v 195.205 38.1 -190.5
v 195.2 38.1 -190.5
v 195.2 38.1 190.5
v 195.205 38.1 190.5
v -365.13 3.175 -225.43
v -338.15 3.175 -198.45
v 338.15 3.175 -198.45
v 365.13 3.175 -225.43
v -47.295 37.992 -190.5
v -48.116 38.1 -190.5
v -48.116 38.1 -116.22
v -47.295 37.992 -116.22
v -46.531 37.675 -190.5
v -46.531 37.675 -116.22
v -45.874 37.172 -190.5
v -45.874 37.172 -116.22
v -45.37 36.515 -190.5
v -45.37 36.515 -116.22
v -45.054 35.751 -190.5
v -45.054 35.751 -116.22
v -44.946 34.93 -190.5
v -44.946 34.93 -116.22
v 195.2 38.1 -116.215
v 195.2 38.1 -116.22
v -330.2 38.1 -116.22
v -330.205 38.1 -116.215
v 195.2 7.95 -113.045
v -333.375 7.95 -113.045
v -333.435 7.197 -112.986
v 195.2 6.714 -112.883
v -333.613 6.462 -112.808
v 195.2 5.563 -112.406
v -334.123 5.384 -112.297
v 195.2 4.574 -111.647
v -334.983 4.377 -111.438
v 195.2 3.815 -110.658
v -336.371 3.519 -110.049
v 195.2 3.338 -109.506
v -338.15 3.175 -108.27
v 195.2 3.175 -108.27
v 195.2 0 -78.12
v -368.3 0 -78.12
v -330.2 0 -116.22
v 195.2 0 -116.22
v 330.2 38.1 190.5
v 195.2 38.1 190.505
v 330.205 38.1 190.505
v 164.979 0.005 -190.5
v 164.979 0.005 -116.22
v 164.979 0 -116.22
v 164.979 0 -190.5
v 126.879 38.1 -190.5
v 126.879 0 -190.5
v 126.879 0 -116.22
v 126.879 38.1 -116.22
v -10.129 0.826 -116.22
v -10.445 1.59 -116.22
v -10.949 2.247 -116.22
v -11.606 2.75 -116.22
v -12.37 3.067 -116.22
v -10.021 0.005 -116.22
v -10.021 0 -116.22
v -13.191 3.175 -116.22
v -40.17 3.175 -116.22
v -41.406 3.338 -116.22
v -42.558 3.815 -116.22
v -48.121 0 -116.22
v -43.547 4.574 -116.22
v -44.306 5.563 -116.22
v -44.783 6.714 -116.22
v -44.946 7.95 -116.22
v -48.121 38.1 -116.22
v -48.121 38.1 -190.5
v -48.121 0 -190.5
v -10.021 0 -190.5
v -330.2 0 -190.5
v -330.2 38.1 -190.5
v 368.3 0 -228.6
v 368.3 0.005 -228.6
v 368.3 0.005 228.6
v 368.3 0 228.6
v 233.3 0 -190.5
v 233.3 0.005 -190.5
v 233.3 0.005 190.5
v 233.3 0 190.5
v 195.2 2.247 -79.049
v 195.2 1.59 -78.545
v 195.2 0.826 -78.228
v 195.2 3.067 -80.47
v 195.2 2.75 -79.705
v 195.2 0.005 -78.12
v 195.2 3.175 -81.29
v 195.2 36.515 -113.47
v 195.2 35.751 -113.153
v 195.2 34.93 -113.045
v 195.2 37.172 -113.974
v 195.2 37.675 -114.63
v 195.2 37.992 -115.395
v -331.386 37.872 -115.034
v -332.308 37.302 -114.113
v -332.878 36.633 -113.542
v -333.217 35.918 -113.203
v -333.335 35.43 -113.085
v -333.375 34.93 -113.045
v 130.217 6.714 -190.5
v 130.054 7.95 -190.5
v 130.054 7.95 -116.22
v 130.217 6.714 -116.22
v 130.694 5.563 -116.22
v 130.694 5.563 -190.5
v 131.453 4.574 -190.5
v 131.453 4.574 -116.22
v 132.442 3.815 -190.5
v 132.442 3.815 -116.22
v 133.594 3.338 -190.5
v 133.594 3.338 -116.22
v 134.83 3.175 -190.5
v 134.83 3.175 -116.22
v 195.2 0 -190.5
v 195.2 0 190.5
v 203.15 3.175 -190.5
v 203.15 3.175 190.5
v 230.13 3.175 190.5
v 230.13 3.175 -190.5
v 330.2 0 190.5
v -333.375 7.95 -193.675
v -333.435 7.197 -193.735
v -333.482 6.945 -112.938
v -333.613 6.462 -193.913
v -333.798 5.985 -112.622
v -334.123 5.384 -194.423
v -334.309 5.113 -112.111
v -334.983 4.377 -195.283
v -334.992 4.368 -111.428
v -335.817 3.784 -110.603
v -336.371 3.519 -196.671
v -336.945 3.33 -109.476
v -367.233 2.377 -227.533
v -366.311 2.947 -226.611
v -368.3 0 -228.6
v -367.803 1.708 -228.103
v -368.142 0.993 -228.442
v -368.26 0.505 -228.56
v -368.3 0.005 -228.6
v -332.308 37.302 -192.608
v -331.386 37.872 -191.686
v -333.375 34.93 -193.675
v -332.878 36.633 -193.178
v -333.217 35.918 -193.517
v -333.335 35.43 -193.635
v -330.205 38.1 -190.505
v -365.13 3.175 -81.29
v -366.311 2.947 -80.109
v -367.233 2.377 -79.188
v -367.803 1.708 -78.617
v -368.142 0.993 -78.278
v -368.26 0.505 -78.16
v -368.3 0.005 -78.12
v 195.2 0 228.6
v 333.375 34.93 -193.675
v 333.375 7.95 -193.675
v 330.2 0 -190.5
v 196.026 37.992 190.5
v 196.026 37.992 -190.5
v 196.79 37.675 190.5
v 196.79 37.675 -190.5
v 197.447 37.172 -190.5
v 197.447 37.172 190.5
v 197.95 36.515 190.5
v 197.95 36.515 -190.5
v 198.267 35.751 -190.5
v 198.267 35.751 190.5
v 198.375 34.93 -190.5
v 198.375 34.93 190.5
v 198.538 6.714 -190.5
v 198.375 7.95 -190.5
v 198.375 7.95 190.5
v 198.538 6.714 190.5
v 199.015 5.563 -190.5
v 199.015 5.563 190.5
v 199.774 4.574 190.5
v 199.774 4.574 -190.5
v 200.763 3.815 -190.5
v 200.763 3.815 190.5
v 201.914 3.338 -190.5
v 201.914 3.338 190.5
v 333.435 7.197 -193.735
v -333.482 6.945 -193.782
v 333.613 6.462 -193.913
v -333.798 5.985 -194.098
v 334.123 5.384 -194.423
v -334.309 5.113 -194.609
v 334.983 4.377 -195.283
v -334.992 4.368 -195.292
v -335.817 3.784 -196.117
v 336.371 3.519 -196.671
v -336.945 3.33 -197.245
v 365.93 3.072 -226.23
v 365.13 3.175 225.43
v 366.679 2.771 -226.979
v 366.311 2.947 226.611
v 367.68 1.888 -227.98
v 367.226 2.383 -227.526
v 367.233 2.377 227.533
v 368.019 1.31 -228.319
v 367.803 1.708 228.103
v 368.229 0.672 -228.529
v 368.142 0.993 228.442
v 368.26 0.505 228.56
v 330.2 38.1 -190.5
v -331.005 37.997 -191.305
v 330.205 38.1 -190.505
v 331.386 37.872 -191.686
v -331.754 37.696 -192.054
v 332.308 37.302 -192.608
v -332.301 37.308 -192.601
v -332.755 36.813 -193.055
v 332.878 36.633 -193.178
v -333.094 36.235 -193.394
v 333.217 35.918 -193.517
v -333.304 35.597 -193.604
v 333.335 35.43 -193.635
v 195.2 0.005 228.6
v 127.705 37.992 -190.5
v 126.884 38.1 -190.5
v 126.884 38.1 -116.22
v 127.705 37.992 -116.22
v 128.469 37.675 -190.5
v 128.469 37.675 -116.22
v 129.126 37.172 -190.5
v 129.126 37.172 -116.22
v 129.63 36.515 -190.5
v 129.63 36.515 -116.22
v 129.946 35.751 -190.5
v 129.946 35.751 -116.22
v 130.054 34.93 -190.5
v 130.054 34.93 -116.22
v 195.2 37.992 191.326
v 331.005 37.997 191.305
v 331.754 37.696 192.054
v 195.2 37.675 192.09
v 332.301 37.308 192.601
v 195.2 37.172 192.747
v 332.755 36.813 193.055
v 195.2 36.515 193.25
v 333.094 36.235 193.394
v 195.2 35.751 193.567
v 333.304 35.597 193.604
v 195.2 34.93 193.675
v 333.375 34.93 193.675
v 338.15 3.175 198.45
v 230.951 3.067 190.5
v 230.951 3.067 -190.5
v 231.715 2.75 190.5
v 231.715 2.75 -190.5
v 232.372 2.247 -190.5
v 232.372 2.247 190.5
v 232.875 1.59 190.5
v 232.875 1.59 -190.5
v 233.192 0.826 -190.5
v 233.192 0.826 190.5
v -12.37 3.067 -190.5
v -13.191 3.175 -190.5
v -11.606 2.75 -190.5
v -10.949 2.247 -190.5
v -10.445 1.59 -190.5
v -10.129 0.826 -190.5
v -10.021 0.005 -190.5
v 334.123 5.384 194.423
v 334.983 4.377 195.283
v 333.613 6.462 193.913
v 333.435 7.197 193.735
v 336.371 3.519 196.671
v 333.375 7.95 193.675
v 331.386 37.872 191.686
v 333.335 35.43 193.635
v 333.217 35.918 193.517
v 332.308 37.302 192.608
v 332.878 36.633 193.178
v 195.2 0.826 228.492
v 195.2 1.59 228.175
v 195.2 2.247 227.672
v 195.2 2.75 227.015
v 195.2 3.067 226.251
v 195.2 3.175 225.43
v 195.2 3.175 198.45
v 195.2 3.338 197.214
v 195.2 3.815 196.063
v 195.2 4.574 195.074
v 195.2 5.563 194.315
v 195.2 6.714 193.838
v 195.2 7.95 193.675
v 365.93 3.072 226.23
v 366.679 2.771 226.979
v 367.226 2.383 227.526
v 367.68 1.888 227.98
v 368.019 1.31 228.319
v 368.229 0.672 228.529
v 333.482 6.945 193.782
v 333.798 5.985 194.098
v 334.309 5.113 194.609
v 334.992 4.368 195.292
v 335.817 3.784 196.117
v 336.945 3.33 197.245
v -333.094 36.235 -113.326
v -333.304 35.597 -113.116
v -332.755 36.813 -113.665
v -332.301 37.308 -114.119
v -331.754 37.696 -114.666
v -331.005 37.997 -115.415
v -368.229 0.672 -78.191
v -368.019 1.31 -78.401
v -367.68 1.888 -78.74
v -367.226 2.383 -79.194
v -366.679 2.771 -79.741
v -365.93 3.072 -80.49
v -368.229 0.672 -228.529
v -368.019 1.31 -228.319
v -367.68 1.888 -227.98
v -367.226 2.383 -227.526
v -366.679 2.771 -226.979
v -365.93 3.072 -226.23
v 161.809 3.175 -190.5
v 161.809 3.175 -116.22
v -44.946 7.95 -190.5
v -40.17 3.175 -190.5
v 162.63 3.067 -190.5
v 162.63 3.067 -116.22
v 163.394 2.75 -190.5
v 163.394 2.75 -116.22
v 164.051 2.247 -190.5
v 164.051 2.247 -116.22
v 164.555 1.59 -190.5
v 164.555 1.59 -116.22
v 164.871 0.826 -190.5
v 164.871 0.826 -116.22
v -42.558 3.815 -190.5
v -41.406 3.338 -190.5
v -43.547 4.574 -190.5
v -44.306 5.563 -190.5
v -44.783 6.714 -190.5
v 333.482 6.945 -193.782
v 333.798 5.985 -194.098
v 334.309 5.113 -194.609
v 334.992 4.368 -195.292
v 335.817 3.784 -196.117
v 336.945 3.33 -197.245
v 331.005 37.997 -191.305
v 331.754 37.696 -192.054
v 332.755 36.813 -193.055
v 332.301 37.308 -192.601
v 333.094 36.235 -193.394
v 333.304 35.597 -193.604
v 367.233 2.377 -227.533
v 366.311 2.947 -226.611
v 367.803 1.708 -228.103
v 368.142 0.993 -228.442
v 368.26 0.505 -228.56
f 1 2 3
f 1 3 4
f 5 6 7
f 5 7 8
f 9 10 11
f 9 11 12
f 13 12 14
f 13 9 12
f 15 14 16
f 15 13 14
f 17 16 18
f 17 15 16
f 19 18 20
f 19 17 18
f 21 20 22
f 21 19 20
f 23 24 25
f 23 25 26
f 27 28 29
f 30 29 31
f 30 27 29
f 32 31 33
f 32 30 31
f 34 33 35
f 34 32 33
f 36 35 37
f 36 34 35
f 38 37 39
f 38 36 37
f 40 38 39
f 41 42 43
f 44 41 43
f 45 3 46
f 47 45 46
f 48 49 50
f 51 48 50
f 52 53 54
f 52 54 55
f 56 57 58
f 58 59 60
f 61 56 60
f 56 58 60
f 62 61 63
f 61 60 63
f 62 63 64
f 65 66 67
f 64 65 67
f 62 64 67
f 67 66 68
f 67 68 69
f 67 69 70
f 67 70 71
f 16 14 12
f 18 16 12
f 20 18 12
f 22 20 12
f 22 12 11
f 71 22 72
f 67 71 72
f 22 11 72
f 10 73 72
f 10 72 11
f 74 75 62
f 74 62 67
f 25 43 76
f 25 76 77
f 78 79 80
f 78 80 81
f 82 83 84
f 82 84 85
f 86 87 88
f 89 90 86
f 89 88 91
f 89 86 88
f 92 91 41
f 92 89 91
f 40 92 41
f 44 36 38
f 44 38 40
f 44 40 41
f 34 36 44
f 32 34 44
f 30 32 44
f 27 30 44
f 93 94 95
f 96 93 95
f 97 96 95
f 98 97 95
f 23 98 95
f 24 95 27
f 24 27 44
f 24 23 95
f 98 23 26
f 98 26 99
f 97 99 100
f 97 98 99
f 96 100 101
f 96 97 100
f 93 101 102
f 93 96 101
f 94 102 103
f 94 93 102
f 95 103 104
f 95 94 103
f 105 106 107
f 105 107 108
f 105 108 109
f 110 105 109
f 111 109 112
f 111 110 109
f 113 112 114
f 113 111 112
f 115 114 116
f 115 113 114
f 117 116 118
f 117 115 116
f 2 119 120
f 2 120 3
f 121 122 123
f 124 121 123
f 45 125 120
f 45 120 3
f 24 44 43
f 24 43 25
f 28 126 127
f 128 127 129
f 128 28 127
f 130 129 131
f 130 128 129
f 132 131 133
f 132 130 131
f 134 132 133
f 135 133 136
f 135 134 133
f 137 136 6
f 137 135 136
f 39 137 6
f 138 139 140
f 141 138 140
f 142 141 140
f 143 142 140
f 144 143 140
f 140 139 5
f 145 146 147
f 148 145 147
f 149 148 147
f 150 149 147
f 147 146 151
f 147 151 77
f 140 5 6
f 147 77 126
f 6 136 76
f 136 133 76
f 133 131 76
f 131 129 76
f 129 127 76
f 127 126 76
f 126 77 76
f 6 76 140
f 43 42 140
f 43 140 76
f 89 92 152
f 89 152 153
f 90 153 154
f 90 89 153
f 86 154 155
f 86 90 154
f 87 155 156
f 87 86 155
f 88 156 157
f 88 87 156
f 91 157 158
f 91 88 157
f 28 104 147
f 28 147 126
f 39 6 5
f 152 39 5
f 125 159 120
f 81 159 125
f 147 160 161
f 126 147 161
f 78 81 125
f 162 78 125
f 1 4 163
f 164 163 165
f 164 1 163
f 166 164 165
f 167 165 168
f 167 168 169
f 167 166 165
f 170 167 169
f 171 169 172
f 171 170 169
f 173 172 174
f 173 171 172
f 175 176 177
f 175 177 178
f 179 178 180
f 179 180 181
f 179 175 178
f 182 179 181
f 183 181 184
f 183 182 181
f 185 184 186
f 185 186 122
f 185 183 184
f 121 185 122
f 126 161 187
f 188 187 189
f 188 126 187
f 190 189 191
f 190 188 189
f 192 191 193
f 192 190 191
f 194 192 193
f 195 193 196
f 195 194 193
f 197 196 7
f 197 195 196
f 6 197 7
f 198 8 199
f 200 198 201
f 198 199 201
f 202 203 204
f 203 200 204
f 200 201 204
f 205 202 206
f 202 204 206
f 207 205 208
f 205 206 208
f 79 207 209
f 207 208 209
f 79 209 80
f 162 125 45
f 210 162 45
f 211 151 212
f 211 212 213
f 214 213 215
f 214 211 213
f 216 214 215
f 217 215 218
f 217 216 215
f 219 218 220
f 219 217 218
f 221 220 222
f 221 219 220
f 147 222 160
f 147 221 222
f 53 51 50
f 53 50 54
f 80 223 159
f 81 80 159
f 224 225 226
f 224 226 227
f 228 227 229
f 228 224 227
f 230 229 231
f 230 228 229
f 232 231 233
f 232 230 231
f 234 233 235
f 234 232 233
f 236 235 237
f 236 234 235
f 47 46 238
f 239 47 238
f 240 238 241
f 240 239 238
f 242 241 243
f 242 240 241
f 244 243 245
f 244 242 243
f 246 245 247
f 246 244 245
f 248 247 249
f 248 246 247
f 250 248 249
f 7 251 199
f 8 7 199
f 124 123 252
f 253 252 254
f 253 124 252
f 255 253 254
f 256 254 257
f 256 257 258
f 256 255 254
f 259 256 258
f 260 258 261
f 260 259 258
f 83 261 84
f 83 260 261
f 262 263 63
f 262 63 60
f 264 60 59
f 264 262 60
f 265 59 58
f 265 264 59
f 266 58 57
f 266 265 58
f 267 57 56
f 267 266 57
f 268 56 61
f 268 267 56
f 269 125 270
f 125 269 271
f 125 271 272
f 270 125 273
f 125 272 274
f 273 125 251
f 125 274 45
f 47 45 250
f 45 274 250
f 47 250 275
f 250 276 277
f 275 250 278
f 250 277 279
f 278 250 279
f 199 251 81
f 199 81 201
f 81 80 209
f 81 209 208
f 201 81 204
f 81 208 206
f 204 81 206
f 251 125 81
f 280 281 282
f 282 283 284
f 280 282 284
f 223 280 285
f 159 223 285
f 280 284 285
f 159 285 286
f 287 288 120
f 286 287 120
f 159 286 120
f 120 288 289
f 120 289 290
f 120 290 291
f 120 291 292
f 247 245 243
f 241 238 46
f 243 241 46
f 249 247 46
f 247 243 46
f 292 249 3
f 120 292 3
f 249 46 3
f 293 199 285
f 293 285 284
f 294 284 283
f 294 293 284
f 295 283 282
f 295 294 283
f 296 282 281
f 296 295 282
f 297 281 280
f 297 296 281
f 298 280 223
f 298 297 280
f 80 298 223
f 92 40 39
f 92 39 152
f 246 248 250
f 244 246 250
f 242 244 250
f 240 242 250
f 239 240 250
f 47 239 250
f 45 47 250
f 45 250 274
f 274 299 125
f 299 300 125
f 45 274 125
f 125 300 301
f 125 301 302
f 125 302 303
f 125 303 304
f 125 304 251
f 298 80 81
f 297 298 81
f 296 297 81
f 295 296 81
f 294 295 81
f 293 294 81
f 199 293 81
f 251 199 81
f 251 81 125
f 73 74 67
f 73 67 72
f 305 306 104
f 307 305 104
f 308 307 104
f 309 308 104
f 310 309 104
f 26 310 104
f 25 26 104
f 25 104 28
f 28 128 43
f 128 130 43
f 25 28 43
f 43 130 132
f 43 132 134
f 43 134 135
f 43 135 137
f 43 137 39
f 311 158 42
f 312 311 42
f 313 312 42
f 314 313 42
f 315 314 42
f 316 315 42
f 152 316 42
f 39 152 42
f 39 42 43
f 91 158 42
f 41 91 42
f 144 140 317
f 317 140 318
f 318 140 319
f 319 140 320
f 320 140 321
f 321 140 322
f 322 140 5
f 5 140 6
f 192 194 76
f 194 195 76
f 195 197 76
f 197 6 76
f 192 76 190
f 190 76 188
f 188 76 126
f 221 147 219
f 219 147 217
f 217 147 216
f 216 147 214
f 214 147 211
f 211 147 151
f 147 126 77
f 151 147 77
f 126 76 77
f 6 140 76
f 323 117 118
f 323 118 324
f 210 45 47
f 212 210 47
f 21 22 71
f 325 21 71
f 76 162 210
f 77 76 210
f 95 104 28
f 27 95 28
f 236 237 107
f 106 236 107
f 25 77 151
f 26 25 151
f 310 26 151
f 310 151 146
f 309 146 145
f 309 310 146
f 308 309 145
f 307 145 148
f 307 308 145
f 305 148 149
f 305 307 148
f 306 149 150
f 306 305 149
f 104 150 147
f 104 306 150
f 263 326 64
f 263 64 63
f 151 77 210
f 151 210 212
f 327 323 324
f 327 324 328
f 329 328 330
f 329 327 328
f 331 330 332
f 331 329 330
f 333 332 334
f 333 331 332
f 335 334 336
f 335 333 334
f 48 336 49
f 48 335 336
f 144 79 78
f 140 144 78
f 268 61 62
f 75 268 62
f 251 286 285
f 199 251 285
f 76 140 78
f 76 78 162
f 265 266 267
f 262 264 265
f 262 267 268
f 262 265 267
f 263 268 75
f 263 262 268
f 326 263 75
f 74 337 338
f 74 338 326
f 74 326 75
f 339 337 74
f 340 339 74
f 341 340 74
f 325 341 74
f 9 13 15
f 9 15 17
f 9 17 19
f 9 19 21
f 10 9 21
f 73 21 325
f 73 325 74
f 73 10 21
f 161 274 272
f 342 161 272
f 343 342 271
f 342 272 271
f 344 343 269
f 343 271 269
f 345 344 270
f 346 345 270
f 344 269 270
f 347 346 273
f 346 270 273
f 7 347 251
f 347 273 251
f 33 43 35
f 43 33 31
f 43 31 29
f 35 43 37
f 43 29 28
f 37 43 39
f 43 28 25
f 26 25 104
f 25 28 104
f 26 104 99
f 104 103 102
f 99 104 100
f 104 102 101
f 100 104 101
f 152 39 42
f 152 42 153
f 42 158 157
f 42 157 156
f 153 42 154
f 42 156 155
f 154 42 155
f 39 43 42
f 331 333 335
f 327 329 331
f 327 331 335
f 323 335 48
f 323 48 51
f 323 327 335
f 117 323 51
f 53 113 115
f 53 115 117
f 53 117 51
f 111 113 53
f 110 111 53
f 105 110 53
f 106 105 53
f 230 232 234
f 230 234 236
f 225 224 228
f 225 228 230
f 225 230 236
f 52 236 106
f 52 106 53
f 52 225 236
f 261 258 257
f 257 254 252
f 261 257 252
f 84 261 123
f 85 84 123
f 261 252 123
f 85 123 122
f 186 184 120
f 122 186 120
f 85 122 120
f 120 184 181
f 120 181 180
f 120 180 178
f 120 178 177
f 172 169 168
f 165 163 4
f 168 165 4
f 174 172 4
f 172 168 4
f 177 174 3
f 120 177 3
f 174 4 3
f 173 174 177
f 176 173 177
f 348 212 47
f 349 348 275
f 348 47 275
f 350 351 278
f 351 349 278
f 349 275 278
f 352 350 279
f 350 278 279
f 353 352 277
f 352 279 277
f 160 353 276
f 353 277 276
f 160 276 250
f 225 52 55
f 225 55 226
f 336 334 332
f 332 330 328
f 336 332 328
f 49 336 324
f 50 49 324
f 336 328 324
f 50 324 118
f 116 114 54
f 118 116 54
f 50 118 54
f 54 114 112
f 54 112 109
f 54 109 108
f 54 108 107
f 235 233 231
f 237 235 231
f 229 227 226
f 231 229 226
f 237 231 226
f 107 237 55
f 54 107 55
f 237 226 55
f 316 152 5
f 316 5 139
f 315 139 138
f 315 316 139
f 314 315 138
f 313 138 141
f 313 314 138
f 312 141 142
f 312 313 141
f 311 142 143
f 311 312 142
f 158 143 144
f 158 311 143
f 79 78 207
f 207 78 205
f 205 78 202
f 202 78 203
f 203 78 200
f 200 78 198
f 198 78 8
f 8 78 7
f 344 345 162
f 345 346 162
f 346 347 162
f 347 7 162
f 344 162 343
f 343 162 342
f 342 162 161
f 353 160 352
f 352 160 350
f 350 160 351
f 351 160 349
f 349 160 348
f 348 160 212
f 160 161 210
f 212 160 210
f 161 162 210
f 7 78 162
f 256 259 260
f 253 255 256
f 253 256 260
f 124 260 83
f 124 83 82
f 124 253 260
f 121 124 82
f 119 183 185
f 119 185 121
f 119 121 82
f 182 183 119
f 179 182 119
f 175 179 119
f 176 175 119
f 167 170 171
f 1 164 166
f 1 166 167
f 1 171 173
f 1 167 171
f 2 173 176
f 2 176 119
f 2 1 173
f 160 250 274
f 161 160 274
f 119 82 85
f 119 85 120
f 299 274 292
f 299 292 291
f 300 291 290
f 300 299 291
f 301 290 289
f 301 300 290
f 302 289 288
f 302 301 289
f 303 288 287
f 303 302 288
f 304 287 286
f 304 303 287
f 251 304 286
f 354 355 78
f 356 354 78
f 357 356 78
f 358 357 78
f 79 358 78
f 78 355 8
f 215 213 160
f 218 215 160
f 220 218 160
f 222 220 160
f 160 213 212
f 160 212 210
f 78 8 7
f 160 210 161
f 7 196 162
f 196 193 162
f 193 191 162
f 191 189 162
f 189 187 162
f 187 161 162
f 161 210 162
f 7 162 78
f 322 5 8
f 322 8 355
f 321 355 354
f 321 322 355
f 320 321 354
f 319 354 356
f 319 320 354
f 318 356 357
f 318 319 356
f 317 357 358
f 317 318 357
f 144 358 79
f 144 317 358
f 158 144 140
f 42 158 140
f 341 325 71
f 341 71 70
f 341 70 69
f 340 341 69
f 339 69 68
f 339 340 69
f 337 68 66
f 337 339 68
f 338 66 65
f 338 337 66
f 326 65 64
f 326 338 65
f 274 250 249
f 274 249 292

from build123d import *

# Parameters (mm, degrees)
STRUCTURAL_MEMBER4_DEPTH        = 580.281536726
STRUCTURAL_MEMBER4_2_DEPTH      = 184.04273572
STRUCTURAL_MEMBER4_3_DEPTH      = 770.163073453
STRUCTURAL_MEMBER4_4_DEPTH      = 435.881536726
STRUCTURAL_MEMBER4_4_DEPTH_BACK = 54.881536726
STRUCTURAL_MEMBER4_5_DEPTH      = 189.881536726
STRUCTURAL_MEMBER5_DEPTH        = 381
STRUCTURAL_MEMBER5_2_DEPTH      = 74.279662267
STRUCTURAL_MEMBER5_3_DEPTH      = 74.279662267


with BuildPart() as part:
    # Sketch114 on segment 1 (carried to segment 1) → Structural Member4 (new body)
    with BuildSketch(Plane(origin=(195.2, 0, -116.220337733), x_dir=(0, 0, 1), z_dir=(-1, 0, 0))):
        with BuildLine():
            Line((0, 0), (0, 38.1))
            Line((0, 38.1), (0.00508, 38.1))
            ThreePointArc((0.00508, 38.1), (2.246551928, 37.171551928), (3.175, 34.93008))
            Line((3.175, 34.93008), (3.175, 7.9502))
            ThreePointArc((3.175, 7.9502), (4.573623698, 4.573623698), (7.9502, 3.175))
            Line((7.9502, 3.175), (34.93008, 3.175))
            ThreePointArc((34.93008, 3.175), (37.171551928, 2.246551928), (38.1, 0.00508))
            Line((38.1, 0.00508), (38.1, 0))
            Line((38.1, 0), (0, 0))
        make_face()
    extrude(amount=STRUCTURAL_MEMBER4_DEPTH)

    # Structural Member4 mitre 1
    split(bisect_by=Plane(origin=(-330.2, 0, -116.220337733), x_dir=(0, 1, 0), z_dir=(0.707106781, 0, 0.707106781)), keep=Keep.TOP)


with BuildPart() as body_2:
    # Sketch114 on segment 2 (carried to segment 2) → Structural Member4 2 (new body)
    with BuildSketch(Plane(origin=(-330.2, 0, -61.338801007), x_dir=(-1, 0, 0), z_dir=(0, 0, -1))):
        with BuildLine():
            Line((0, 0), (0, 38.1))
            Line((0, 38.1), (0.00508, 38.1))
            ThreePointArc((0.00508, 38.1), (2.246551928, 37.171551928), (3.175, 34.93008))
            Line((3.175, 34.93008), (3.175, 7.9502))
            ThreePointArc((3.175, 7.9502), (4.573623698, 4.573623698), (7.9502, 3.175))
            Line((7.9502, 3.175), (34.93008, 3.175))
            ThreePointArc((34.93008, 3.175), (37.171551928, 2.246551928), (38.1, 0.00508))
            Line((38.1, 0.00508), (38.1, 0))
            Line((38.1, 0), (0, 0))
        make_face()
    extrude(amount=STRUCTURAL_MEMBER4_2_DEPTH)

    # Structural Member4 2 mitre 1
    split(bisect_by=Plane(origin=(-330.2, 0, -190.5), x_dir=(0, -1, 0), z_dir=(-0.707106781, 0, 0.707106781)), keep=Keep.TOP)

    # Structural Member4 2 mitre 2
    split(bisect_by=Plane(origin=(-330.2, 0, -116.220337733), x_dir=(0, -1, 0), z_dir=(-0.707106781, 0, -0.707106781)), keep=Keep.TOP)


with BuildPart() as body_3:
    # Sketch114 on segment 3 (carried to segment 3) → Structural Member4 3 (new body)
    with BuildSketch(Plane(origin=(-385.081536726, 0, -190.5), x_dir=(0, 0, -1), z_dir=(1, 0, 0))):
        with BuildLine():
            Line((0, 0), (0, 38.1))
            Line((0, 38.1), (0.00508, 38.1))
            ThreePointArc((0.00508, 38.1), (2.246551928, 37.171551928), (3.175, 34.93008))
            Line((3.175, 34.93008), (3.175, 7.9502))
            ThreePointArc((3.175, 7.9502), (4.573623698, 4.573623698), (7.9502, 3.175))
            Line((7.9502, 3.175), (34.93008, 3.175))
            ThreePointArc((34.93008, 3.175), (37.171551928, 2.246551928), (38.1, 0.00508))
            Line((38.1, 0.00508), (38.1, 0))
            Line((38.1, 0), (0, 0))
        make_face()
    extrude(amount=STRUCTURAL_MEMBER4_3_DEPTH)

    # Structural Member4 3 mitre 1
    split(bisect_by=Plane(origin=(-330.2, 0, -190.5), x_dir=(0, 1, 0), z_dir=(0.707106781, 0, -0.707106781)), keep=Keep.TOP)

    # Structural Member4 3 mitre 2
    split(bisect_by=Plane(origin=(330.2, 0, -190.5), x_dir=(0, -1, 0), z_dir=(-0.707106781, 0, -0.707106781)), keep=Keep.TOP)


with BuildPart() as body_4:
    # Sketch114 → Structural Member4 4 (new, two sides)
    with BuildSketch(Plane(origin=(330.2, 0, -190.5), x_dir=(1, 0, 0), z_dir=(0, 0, 1))) as structural_member4_4_sk:
        with BuildLine():
            Line((0, 0), (0, 38.1))
            Line((0, 38.1), (0.00508, 38.1))
            ThreePointArc((0.00508, 38.1), (2.246551928, 37.171551928), (3.175, 34.93008))
            Line((3.175, 34.93008), (3.175, 7.9502))
            ThreePointArc((3.175, 7.9502), (4.573623698, 4.573623698), (7.9502, 3.175))
            Line((7.9502, 3.175), (34.93008, 3.175))
            ThreePointArc((34.93008, 3.175), (37.171551928, 2.246551928), (38.1, 0.00508))
            Line((38.1, 0.00508), (38.1, 0))
            Line((38.1, 0), (0, 0))
        make_face()
    extrude(amount=STRUCTURAL_MEMBER4_4_DEPTH)
    extrude(structural_member4_4_sk.sketch, amount=-STRUCTURAL_MEMBER4_4_DEPTH_BACK)

    # Structural Member4 4 mitre 1
    split(bisect_by=Plane(origin=(330.2, 0, -190.5), x_dir=(0, 1, 0), z_dir=(0.707106781, 0, 0.707106781)), keep=Keep.TOP)

    # Structural Member4 4 mitre 2
    split(bisect_by=Plane(origin=(330.2, 0, 190.5), x_dir=(0, 1, 0), z_dir=(0.707106781, 0, -0.707106781)), keep=Keep.TOP)


with BuildPart() as body_5:
    # Sketch114 on segment 5 (carried to segment 5) → Structural Member4 5 (new body)
    with BuildSketch(Plane(origin=(385.081536726, 0, 190.5), x_dir=(0, 0, 1), z_dir=(-1, 0, 0))):
        with BuildLine():
            Line((0, 0), (0, 38.1))
            Line((0, 38.1), (0.00508, 38.1))
            ThreePointArc((0.00508, 38.1), (2.246551928, 37.171551928), (3.175, 34.93008))
            Line((3.175, 34.93008), (3.175, 7.9502))
            ThreePointArc((3.175, 7.9502), (4.573623698, 4.573623698), (7.9502, 3.175))
            Line((7.9502, 3.175), (34.93008, 3.175))
            ThreePointArc((34.93008, 3.175), (37.171551928, 2.246551928), (38.1, 0.00508))
            Line((38.1, 0.00508), (38.1, 0))
            Line((38.1, 0), (0, 0))
        make_face()
    extrude(amount=STRUCTURAL_MEMBER4_5_DEPTH)

    # Structural Member4 5 mitre 1
    split(bisect_by=Plane(origin=(330.2, 0, 190.5), x_dir=(0, -1, 0), z_dir=(-0.707106781, 0, 0.707106781)), keep=Keep.TOP)


with BuildPart() as body_6:
    # Sketch115 → Structural Member5 (new body)
    with BuildSketch(Plane(origin=(195.2, 0, -190.5), x_dir=(1, 0, 0), z_dir=(0, 0, 1))):
        with BuildLine():
            Line((0, 0), (0, 38.1))
            Line((0, 38.1), (0.00508, 38.1))
            ThreePointArc((0.00508, 38.1), (2.246551928, 37.171551928), (3.175, 34.93008))
            Line((3.175, 34.93008), (3.175, 7.9502))
            ThreePointArc((3.175, 7.9502), (4.573623698, 4.573623698), (7.9502, 3.175))
            Line((7.9502, 3.175), (34.93008, 3.175))
            ThreePointArc((34.93008, 3.175), (37.171551928, 2.246551928), (38.1, 0.00508))
            Line((38.1, 0.00508), (38.1, 0))
            Line((38.1, 0), (0, 0))
        make_face()
    extrude(amount=STRUCTURAL_MEMBER5_DEPTH)


with BuildPart() as body_7:
    # Sketch115 on segment 2 (carried to segment 2) → Structural Member5 2 (new body)
    with BuildSketch(Plane(origin=(126.879374737, 0, -190.5), x_dir=(1, 0, 0), z_dir=(0, 0, 1))):
        with BuildLine():
            Line((0, 0), (0, 38.1))
            Line((0, 38.1), (0.00508, 38.1))
            ThreePointArc((0.00508, 38.1), (2.246551928, 37.171551928), (3.175, 34.93008))
            Line((3.175, 34.93008), (3.175, 7.9502))
            ThreePointArc((3.175, 7.9502), (4.573623698, 4.573623698), (7.9502, 3.175))
            Line((7.9502, 3.175), (34.93008, 3.175))
            ThreePointArc((34.93008, 3.175), (37.171551928, 2.246551928), (38.1, 0.00508))
            Line((38.1, 0.00508), (38.1, 0))
            Line((38.1, 0), (0, 0))
        make_face()
    extrude(amount=STRUCTURAL_MEMBER5_2_DEPTH)


with BuildPart() as body_8:
    # Sketch115 on segment 3 (carried to segment 3) → Structural Member5 3 (new body)
    with BuildSketch(Plane(origin=(-48.120625263, 0, -190.5), x_dir=(1, 0, 0), z_dir=(0, 0, 1))):
        with BuildLine():
            Line((0, 0), (0, 38.1))
            Line((0, 38.1), (0.00508, 38.1))
            ThreePointArc((0.00508, 38.1), (2.246551928, 37.171551928), (3.175, 34.93008))
            Line((3.175, 34.93008), (3.175, 7.9502))
            ThreePointArc((3.175, 7.9502), (4.573623698, 4.573623698), (7.9502, 3.175))
            Line((7.9502, 3.175), (34.93008, 3.175))
            ThreePointArc((34.93008, 3.175), (37.171551928, 2.246551928), (38.1, 0.00508))
            Line((38.1, 0.00508), (38.1, 0))
            Line((38.1, 0), (0, 0))
        make_face()
    extrude(amount=STRUCTURAL_MEMBER5_3_DEPTH)


solid = Compound([part.part, body_2.part, body_3.part, body_4.part, body_5.part, body_6.part, body_7.part, body_8.part])
